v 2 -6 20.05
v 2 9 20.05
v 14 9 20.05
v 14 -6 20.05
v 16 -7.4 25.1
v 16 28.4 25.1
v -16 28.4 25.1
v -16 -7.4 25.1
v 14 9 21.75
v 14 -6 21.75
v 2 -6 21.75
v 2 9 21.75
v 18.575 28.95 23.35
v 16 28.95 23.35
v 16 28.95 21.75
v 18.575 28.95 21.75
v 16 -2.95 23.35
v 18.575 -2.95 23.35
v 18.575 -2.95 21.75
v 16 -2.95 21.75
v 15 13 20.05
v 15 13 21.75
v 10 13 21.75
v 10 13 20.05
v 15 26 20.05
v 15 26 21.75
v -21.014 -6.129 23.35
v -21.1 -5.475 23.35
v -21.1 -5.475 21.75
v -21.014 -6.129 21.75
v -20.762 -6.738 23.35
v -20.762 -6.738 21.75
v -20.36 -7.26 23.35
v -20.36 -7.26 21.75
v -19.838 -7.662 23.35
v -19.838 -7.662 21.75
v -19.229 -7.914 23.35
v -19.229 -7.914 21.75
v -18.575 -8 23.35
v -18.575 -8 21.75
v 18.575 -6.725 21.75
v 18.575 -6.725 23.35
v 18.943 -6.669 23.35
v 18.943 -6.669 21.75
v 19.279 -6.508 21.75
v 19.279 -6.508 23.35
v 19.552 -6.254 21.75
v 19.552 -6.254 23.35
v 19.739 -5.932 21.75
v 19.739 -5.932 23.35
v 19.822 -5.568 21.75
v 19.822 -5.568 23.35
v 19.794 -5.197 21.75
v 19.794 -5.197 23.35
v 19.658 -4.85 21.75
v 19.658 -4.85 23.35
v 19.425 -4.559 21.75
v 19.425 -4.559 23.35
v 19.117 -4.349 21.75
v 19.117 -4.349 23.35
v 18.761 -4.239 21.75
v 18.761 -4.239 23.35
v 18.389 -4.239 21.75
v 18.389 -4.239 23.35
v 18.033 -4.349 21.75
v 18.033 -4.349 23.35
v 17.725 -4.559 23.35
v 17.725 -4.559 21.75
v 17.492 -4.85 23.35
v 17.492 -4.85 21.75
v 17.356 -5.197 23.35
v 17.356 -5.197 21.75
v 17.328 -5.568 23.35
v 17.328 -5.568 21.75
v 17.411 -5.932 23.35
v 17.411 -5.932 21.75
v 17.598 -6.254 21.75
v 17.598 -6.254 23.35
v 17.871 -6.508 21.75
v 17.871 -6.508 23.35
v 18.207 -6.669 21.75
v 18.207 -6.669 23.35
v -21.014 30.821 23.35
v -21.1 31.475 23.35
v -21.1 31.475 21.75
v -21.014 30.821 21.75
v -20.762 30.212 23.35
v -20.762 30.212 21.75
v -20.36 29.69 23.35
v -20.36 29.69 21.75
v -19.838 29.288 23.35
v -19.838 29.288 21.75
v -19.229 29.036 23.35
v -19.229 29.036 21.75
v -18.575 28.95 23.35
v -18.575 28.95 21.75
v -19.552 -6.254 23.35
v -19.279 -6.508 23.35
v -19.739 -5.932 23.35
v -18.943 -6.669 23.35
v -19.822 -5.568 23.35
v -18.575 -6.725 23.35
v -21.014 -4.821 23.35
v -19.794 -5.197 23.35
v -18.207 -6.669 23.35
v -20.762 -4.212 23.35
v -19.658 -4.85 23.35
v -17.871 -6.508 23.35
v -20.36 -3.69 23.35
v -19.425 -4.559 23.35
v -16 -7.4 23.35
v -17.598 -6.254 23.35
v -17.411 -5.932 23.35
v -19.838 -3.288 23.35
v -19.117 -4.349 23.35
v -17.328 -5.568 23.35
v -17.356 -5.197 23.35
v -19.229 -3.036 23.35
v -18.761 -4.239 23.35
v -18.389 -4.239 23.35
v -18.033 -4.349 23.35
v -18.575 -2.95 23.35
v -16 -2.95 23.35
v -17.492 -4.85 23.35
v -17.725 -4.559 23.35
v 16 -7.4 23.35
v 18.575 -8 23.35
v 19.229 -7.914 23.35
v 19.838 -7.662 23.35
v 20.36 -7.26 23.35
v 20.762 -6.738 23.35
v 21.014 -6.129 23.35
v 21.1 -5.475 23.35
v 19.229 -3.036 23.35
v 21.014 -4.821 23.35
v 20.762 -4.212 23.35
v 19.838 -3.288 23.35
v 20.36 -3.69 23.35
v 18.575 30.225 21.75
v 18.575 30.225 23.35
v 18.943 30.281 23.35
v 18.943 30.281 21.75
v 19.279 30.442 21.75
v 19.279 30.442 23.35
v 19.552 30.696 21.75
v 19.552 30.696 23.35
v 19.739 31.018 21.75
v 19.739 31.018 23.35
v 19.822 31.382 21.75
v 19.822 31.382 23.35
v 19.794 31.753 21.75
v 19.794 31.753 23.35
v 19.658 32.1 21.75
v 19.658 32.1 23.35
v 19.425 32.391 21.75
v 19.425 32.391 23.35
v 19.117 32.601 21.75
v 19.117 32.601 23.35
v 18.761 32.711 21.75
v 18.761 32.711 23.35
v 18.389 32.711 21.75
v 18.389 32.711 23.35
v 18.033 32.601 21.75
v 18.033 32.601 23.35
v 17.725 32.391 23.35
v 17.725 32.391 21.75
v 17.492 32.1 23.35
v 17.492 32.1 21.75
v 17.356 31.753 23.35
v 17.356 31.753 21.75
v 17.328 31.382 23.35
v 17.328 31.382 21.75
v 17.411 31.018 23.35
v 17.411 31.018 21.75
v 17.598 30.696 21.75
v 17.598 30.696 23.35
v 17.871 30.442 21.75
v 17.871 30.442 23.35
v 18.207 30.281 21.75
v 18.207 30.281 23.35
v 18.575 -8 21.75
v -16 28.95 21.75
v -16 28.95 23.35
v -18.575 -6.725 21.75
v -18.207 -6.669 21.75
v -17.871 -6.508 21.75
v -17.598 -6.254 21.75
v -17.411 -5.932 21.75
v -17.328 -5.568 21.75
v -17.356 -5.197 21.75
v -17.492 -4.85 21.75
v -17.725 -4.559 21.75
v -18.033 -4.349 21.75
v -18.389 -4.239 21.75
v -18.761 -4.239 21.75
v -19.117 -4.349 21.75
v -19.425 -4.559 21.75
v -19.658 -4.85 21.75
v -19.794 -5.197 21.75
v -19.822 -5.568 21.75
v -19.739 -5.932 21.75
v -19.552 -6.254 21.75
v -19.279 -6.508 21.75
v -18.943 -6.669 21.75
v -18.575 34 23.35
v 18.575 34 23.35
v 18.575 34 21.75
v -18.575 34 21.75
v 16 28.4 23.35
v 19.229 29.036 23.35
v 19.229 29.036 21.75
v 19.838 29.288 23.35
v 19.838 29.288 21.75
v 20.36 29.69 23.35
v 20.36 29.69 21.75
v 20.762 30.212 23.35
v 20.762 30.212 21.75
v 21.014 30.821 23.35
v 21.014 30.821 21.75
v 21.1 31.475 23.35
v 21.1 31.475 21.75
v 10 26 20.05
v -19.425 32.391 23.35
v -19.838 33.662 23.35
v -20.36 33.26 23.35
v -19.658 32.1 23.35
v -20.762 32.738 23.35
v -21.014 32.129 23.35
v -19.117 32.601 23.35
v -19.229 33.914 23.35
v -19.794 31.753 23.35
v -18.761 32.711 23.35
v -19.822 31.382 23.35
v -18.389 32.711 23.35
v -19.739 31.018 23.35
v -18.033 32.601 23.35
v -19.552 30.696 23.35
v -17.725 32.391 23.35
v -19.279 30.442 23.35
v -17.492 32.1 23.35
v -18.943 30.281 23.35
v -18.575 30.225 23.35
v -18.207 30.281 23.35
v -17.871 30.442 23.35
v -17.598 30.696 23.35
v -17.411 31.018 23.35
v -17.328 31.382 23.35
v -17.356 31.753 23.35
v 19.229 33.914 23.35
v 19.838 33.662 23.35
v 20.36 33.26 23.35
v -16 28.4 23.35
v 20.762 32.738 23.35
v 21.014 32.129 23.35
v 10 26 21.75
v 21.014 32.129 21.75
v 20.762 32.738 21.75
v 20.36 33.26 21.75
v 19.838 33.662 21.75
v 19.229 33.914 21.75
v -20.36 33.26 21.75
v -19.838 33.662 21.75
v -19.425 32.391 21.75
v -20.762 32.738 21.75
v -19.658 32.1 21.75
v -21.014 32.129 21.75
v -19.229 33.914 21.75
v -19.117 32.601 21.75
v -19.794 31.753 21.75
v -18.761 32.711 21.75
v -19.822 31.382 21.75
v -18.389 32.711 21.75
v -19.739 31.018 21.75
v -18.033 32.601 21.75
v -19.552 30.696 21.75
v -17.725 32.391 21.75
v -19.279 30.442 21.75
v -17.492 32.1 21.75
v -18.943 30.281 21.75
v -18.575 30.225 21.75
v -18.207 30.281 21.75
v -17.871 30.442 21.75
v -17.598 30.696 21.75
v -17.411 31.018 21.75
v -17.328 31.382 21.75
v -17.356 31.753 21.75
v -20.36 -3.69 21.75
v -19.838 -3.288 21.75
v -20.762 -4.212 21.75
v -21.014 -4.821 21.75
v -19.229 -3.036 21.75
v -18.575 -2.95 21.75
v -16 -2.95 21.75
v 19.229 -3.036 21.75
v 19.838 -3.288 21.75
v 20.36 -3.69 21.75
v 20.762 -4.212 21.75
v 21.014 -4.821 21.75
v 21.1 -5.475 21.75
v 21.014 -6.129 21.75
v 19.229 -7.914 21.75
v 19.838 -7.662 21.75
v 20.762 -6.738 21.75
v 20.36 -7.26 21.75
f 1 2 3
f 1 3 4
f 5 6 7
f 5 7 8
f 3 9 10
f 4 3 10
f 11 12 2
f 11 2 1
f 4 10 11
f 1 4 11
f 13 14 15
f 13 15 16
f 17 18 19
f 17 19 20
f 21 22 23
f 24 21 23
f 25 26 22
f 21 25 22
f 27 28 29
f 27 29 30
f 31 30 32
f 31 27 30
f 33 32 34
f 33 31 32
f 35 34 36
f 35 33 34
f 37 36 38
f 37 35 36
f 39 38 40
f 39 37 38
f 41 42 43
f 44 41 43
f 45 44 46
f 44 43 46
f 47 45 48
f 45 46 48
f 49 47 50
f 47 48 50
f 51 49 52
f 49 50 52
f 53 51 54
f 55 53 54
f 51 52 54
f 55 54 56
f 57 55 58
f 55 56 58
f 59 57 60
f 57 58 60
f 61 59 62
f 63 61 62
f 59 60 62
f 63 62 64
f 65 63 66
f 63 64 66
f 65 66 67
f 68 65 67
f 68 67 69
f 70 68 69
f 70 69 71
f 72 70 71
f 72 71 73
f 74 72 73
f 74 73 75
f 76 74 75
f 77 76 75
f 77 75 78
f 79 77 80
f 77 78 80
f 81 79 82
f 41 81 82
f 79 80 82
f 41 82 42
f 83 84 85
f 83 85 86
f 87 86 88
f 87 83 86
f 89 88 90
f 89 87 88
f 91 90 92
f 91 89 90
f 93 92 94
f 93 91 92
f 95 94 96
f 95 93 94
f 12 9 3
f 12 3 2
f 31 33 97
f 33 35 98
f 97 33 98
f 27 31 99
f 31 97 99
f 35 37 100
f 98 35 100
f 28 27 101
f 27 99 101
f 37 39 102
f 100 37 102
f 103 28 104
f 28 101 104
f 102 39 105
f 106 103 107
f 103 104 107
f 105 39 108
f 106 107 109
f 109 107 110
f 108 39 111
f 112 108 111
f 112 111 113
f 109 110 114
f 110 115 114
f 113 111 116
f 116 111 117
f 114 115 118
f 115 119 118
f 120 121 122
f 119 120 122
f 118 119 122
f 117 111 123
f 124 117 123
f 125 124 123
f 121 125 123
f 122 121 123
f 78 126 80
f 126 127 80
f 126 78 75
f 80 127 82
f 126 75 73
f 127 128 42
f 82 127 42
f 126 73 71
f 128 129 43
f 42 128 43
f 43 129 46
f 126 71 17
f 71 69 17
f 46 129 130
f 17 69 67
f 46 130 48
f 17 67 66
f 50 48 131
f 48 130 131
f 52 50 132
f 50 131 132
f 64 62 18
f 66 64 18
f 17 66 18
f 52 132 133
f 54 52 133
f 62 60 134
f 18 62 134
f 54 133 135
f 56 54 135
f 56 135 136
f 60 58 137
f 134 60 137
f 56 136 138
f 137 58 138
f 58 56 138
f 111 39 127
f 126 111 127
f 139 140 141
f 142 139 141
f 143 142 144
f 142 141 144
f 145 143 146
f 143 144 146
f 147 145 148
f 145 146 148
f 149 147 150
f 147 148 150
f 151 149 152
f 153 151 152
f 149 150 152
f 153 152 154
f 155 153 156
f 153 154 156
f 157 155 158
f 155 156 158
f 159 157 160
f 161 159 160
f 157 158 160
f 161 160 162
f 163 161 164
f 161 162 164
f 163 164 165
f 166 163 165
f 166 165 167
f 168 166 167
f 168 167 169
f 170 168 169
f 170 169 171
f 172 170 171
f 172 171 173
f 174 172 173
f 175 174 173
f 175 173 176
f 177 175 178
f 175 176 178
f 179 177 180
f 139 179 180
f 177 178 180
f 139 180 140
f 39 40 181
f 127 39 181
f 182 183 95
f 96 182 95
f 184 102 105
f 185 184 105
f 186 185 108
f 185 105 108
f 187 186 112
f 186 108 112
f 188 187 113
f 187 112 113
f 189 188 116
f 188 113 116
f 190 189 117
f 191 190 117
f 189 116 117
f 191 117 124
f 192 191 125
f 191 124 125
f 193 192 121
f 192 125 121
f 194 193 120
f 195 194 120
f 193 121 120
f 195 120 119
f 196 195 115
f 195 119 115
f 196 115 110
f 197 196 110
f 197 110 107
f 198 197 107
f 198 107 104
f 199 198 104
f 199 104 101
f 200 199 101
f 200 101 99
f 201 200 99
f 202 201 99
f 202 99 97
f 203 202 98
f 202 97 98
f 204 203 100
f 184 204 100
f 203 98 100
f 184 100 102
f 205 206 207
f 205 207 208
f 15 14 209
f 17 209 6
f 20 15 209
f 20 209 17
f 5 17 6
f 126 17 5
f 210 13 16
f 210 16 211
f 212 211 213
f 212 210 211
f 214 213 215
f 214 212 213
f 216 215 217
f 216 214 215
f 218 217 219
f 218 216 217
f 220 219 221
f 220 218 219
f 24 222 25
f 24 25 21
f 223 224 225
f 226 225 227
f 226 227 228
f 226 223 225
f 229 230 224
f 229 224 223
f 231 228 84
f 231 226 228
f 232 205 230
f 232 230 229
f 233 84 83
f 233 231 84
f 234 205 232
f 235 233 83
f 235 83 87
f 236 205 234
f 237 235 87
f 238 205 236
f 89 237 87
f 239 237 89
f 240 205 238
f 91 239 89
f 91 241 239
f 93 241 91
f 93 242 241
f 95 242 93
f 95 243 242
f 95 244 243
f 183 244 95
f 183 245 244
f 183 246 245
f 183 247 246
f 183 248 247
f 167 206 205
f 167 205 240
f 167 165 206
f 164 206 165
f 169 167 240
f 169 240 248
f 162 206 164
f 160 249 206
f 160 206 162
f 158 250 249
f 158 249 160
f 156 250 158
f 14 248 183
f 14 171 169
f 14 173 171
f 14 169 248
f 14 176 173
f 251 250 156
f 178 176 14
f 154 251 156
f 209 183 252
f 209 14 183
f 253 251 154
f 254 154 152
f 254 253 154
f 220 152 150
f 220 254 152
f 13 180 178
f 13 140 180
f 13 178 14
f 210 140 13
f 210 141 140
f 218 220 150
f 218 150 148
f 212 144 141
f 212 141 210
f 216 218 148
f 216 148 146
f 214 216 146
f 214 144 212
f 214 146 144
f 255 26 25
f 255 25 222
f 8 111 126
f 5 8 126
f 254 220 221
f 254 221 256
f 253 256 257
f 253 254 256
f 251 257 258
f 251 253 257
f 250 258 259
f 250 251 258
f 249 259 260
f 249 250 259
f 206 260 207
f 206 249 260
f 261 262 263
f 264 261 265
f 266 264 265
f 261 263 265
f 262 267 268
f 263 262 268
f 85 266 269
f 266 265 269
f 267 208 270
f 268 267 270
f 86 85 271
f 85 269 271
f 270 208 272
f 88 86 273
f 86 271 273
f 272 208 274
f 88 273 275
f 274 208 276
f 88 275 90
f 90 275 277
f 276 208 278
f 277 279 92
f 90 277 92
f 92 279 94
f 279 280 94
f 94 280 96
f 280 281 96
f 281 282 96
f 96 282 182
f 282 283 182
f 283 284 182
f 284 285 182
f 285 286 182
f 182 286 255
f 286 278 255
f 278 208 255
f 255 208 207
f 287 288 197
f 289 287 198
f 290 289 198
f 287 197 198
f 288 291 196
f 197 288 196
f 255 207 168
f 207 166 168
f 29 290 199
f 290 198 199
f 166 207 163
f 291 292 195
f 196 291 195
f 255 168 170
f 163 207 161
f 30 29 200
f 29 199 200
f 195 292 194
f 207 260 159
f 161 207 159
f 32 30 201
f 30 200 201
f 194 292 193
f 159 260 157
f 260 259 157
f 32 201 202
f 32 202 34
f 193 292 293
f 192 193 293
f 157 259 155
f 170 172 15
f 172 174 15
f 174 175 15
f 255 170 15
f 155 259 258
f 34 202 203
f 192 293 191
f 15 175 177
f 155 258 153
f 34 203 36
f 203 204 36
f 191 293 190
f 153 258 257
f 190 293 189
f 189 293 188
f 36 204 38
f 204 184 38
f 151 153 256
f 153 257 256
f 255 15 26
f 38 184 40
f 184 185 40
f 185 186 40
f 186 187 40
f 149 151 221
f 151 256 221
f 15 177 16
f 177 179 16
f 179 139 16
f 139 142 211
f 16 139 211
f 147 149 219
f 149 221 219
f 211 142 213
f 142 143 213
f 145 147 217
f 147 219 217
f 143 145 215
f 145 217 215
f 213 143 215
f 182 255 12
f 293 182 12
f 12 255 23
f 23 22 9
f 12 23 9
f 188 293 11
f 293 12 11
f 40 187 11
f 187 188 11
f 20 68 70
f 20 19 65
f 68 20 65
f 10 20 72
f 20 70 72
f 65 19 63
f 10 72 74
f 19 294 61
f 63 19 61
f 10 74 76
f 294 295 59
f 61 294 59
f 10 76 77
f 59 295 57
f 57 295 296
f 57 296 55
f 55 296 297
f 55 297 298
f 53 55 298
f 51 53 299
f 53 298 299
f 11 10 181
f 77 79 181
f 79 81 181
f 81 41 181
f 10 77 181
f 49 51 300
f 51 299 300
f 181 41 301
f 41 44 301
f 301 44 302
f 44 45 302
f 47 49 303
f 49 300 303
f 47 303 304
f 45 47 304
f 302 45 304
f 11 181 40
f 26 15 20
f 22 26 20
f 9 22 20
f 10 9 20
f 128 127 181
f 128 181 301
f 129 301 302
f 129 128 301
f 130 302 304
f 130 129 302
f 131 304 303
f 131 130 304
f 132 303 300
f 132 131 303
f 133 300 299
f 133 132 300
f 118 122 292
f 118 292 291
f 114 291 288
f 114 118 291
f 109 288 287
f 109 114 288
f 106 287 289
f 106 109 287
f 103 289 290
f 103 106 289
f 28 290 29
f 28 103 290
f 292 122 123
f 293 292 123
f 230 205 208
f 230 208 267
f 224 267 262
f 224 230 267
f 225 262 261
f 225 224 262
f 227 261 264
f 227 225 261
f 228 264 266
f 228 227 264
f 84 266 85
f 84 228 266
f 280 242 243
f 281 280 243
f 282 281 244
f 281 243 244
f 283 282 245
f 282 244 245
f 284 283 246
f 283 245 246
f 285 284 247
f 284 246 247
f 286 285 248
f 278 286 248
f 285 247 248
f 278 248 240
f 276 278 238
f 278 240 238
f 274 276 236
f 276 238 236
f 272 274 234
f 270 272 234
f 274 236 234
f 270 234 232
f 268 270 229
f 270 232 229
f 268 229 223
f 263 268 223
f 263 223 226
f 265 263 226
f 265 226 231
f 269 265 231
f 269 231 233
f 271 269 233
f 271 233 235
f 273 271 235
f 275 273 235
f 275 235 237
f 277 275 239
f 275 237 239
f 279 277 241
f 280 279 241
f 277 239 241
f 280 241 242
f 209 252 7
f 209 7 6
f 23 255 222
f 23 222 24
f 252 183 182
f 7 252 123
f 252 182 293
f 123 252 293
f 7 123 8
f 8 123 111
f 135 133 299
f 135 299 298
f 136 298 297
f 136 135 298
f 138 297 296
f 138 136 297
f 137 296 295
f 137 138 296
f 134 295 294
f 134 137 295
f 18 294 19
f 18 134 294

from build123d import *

# Parameters (mm, degrees)
SKETCH015_W             = 42
SKETCH015_H             = 32
PAD003_DEPTH            = 1.6
SKETCH016_W             = 35.8
SKETCH016_H             = 32
PAD004_DEPTH            = 1.75
SKETCH017_R             = 1.25
PAD005_DEPTH            = 1.6
SKETCH018_W             = 13
SKETCH018_H             = 5
SKETCH018_W_2           = 15
SKETCH018_H_2           = 12
PAD006_DEPTH            = 1.7
BODY002_PLACEMENT_ANGLE = 90


with BuildPart() as part:
    # Sketch015 → Pad003 (new body)
    with BuildSketch(Plane.XY):
        Rectangle(SKETCH015_W, SKETCH015_H)
    extrude(amount=PAD003_DEPTH)

    # Sketch016 (on Face6 of Pad003) → Pad004 (join)
    with BuildSketch(Plane.XY.offset(1.6)):
        with Locations((2.5, 0)):
            Rectangle(SKETCH016_W, SKETCH016_H)
    extrude(amount=PAD004_DEPTH)

    # Sketch017 (on Face3 of Pad004) → Pad005 (join)
    with BuildSketch(Plane.XY.offset(1.6)):
        with BuildLine():
            Line((-21, 16), (-15.95, 16))
            Line((-15.95, 16), (-15.95, 18.575))
            ThreePointArc((-15.95, 18.575), (-16.689555, 20.360445), (-18.475, 21.1))
            ThreePointArc((-18.475, 21.1), (-20.260445, 20.360445), (-21, 18.575))
            Line((-21, 18.575), (-21, 16))
        make_face()
        with Locations((-18.475, 18.575)):
            Circle(SKETCH017_R, mode=Mode.SUBTRACT)
        with BuildLine():
            Line((15.95, 16), (21, 16))
            Line((21, 16), (21, 18.575))
            ThreePointArc((21, 18.575), (20.260445, 20.360445), (18.475, 21.1))
            ThreePointArc((18.475, 21.1), (16.689555, 20.360445), (15.95, 18.575))
            Line((15.95, 18.575), (15.95, 16))
        make_face()
        with Locations((18.475, 18.575)):
            Circle(SKETCH017_R, mode=Mode.SUBTRACT)
        with BuildLine():
            Line((-21, -16), (-15.95, -16))
            Line((-15.95, -16), (-15.95, -18.575))
            ThreePointArc((-18.475, -21.1), (-16.689555, -20.360445), (-15.95, -18.575))
            ThreePointArc((-21, -18.575), (-20.260445, -20.360445), (-18.475, -21.1))
            Line((-21, -18.575), (-21, -16))
        make_face()
        with Locations((-18.475, -18.575)):
            Circle(SKETCH017_R, mode=Mode.SUBTRACT)
        with BuildLine():
            Line((15.95, -16), (21, -16))
            Line((21, -16), (21, -18.575))
            ThreePointArc((18.475, -21.1), (20.260445, -20.360445), (21, -18.575))
            ThreePointArc((15.95, -18.575), (16.689555, -20.360445), (18.475, -21.1))
            Line((15.95, -18.575), (15.95, -16))
        make_face()
        with Locations((18.475, -18.575)):
            Circle(SKETCH017_R, mode=Mode.SUBTRACT)
    extrude(amount=-PAD005_DEPTH)

    # Sketch018 (on Face15 of Pad005) → Pad006 (join)
    with BuildSketch(Plane(origin=(0, 0, 0), x_dir=(1, 0, 0), z_dir=(0, 0, -1))):
        with Locations((-6.5, -12.5)):
            Rectangle(SKETCH018_W, SKETCH018_H)
        with Locations((11.5, -8)):
            Rectangle(SKETCH018_W_2, SKETCH018_H_2)
    extrude(amount=PAD006_DEPTH)


with BuildPart() as part_1:
    # Body002 placement: moved
    add(part.part.moved(Location((0, 13, 21.75))).rotate(Axis((0, 13, 21.75), (0, 0, -1)), BODY002_PLACEMENT_ANGLE))


solid = part_1.part
